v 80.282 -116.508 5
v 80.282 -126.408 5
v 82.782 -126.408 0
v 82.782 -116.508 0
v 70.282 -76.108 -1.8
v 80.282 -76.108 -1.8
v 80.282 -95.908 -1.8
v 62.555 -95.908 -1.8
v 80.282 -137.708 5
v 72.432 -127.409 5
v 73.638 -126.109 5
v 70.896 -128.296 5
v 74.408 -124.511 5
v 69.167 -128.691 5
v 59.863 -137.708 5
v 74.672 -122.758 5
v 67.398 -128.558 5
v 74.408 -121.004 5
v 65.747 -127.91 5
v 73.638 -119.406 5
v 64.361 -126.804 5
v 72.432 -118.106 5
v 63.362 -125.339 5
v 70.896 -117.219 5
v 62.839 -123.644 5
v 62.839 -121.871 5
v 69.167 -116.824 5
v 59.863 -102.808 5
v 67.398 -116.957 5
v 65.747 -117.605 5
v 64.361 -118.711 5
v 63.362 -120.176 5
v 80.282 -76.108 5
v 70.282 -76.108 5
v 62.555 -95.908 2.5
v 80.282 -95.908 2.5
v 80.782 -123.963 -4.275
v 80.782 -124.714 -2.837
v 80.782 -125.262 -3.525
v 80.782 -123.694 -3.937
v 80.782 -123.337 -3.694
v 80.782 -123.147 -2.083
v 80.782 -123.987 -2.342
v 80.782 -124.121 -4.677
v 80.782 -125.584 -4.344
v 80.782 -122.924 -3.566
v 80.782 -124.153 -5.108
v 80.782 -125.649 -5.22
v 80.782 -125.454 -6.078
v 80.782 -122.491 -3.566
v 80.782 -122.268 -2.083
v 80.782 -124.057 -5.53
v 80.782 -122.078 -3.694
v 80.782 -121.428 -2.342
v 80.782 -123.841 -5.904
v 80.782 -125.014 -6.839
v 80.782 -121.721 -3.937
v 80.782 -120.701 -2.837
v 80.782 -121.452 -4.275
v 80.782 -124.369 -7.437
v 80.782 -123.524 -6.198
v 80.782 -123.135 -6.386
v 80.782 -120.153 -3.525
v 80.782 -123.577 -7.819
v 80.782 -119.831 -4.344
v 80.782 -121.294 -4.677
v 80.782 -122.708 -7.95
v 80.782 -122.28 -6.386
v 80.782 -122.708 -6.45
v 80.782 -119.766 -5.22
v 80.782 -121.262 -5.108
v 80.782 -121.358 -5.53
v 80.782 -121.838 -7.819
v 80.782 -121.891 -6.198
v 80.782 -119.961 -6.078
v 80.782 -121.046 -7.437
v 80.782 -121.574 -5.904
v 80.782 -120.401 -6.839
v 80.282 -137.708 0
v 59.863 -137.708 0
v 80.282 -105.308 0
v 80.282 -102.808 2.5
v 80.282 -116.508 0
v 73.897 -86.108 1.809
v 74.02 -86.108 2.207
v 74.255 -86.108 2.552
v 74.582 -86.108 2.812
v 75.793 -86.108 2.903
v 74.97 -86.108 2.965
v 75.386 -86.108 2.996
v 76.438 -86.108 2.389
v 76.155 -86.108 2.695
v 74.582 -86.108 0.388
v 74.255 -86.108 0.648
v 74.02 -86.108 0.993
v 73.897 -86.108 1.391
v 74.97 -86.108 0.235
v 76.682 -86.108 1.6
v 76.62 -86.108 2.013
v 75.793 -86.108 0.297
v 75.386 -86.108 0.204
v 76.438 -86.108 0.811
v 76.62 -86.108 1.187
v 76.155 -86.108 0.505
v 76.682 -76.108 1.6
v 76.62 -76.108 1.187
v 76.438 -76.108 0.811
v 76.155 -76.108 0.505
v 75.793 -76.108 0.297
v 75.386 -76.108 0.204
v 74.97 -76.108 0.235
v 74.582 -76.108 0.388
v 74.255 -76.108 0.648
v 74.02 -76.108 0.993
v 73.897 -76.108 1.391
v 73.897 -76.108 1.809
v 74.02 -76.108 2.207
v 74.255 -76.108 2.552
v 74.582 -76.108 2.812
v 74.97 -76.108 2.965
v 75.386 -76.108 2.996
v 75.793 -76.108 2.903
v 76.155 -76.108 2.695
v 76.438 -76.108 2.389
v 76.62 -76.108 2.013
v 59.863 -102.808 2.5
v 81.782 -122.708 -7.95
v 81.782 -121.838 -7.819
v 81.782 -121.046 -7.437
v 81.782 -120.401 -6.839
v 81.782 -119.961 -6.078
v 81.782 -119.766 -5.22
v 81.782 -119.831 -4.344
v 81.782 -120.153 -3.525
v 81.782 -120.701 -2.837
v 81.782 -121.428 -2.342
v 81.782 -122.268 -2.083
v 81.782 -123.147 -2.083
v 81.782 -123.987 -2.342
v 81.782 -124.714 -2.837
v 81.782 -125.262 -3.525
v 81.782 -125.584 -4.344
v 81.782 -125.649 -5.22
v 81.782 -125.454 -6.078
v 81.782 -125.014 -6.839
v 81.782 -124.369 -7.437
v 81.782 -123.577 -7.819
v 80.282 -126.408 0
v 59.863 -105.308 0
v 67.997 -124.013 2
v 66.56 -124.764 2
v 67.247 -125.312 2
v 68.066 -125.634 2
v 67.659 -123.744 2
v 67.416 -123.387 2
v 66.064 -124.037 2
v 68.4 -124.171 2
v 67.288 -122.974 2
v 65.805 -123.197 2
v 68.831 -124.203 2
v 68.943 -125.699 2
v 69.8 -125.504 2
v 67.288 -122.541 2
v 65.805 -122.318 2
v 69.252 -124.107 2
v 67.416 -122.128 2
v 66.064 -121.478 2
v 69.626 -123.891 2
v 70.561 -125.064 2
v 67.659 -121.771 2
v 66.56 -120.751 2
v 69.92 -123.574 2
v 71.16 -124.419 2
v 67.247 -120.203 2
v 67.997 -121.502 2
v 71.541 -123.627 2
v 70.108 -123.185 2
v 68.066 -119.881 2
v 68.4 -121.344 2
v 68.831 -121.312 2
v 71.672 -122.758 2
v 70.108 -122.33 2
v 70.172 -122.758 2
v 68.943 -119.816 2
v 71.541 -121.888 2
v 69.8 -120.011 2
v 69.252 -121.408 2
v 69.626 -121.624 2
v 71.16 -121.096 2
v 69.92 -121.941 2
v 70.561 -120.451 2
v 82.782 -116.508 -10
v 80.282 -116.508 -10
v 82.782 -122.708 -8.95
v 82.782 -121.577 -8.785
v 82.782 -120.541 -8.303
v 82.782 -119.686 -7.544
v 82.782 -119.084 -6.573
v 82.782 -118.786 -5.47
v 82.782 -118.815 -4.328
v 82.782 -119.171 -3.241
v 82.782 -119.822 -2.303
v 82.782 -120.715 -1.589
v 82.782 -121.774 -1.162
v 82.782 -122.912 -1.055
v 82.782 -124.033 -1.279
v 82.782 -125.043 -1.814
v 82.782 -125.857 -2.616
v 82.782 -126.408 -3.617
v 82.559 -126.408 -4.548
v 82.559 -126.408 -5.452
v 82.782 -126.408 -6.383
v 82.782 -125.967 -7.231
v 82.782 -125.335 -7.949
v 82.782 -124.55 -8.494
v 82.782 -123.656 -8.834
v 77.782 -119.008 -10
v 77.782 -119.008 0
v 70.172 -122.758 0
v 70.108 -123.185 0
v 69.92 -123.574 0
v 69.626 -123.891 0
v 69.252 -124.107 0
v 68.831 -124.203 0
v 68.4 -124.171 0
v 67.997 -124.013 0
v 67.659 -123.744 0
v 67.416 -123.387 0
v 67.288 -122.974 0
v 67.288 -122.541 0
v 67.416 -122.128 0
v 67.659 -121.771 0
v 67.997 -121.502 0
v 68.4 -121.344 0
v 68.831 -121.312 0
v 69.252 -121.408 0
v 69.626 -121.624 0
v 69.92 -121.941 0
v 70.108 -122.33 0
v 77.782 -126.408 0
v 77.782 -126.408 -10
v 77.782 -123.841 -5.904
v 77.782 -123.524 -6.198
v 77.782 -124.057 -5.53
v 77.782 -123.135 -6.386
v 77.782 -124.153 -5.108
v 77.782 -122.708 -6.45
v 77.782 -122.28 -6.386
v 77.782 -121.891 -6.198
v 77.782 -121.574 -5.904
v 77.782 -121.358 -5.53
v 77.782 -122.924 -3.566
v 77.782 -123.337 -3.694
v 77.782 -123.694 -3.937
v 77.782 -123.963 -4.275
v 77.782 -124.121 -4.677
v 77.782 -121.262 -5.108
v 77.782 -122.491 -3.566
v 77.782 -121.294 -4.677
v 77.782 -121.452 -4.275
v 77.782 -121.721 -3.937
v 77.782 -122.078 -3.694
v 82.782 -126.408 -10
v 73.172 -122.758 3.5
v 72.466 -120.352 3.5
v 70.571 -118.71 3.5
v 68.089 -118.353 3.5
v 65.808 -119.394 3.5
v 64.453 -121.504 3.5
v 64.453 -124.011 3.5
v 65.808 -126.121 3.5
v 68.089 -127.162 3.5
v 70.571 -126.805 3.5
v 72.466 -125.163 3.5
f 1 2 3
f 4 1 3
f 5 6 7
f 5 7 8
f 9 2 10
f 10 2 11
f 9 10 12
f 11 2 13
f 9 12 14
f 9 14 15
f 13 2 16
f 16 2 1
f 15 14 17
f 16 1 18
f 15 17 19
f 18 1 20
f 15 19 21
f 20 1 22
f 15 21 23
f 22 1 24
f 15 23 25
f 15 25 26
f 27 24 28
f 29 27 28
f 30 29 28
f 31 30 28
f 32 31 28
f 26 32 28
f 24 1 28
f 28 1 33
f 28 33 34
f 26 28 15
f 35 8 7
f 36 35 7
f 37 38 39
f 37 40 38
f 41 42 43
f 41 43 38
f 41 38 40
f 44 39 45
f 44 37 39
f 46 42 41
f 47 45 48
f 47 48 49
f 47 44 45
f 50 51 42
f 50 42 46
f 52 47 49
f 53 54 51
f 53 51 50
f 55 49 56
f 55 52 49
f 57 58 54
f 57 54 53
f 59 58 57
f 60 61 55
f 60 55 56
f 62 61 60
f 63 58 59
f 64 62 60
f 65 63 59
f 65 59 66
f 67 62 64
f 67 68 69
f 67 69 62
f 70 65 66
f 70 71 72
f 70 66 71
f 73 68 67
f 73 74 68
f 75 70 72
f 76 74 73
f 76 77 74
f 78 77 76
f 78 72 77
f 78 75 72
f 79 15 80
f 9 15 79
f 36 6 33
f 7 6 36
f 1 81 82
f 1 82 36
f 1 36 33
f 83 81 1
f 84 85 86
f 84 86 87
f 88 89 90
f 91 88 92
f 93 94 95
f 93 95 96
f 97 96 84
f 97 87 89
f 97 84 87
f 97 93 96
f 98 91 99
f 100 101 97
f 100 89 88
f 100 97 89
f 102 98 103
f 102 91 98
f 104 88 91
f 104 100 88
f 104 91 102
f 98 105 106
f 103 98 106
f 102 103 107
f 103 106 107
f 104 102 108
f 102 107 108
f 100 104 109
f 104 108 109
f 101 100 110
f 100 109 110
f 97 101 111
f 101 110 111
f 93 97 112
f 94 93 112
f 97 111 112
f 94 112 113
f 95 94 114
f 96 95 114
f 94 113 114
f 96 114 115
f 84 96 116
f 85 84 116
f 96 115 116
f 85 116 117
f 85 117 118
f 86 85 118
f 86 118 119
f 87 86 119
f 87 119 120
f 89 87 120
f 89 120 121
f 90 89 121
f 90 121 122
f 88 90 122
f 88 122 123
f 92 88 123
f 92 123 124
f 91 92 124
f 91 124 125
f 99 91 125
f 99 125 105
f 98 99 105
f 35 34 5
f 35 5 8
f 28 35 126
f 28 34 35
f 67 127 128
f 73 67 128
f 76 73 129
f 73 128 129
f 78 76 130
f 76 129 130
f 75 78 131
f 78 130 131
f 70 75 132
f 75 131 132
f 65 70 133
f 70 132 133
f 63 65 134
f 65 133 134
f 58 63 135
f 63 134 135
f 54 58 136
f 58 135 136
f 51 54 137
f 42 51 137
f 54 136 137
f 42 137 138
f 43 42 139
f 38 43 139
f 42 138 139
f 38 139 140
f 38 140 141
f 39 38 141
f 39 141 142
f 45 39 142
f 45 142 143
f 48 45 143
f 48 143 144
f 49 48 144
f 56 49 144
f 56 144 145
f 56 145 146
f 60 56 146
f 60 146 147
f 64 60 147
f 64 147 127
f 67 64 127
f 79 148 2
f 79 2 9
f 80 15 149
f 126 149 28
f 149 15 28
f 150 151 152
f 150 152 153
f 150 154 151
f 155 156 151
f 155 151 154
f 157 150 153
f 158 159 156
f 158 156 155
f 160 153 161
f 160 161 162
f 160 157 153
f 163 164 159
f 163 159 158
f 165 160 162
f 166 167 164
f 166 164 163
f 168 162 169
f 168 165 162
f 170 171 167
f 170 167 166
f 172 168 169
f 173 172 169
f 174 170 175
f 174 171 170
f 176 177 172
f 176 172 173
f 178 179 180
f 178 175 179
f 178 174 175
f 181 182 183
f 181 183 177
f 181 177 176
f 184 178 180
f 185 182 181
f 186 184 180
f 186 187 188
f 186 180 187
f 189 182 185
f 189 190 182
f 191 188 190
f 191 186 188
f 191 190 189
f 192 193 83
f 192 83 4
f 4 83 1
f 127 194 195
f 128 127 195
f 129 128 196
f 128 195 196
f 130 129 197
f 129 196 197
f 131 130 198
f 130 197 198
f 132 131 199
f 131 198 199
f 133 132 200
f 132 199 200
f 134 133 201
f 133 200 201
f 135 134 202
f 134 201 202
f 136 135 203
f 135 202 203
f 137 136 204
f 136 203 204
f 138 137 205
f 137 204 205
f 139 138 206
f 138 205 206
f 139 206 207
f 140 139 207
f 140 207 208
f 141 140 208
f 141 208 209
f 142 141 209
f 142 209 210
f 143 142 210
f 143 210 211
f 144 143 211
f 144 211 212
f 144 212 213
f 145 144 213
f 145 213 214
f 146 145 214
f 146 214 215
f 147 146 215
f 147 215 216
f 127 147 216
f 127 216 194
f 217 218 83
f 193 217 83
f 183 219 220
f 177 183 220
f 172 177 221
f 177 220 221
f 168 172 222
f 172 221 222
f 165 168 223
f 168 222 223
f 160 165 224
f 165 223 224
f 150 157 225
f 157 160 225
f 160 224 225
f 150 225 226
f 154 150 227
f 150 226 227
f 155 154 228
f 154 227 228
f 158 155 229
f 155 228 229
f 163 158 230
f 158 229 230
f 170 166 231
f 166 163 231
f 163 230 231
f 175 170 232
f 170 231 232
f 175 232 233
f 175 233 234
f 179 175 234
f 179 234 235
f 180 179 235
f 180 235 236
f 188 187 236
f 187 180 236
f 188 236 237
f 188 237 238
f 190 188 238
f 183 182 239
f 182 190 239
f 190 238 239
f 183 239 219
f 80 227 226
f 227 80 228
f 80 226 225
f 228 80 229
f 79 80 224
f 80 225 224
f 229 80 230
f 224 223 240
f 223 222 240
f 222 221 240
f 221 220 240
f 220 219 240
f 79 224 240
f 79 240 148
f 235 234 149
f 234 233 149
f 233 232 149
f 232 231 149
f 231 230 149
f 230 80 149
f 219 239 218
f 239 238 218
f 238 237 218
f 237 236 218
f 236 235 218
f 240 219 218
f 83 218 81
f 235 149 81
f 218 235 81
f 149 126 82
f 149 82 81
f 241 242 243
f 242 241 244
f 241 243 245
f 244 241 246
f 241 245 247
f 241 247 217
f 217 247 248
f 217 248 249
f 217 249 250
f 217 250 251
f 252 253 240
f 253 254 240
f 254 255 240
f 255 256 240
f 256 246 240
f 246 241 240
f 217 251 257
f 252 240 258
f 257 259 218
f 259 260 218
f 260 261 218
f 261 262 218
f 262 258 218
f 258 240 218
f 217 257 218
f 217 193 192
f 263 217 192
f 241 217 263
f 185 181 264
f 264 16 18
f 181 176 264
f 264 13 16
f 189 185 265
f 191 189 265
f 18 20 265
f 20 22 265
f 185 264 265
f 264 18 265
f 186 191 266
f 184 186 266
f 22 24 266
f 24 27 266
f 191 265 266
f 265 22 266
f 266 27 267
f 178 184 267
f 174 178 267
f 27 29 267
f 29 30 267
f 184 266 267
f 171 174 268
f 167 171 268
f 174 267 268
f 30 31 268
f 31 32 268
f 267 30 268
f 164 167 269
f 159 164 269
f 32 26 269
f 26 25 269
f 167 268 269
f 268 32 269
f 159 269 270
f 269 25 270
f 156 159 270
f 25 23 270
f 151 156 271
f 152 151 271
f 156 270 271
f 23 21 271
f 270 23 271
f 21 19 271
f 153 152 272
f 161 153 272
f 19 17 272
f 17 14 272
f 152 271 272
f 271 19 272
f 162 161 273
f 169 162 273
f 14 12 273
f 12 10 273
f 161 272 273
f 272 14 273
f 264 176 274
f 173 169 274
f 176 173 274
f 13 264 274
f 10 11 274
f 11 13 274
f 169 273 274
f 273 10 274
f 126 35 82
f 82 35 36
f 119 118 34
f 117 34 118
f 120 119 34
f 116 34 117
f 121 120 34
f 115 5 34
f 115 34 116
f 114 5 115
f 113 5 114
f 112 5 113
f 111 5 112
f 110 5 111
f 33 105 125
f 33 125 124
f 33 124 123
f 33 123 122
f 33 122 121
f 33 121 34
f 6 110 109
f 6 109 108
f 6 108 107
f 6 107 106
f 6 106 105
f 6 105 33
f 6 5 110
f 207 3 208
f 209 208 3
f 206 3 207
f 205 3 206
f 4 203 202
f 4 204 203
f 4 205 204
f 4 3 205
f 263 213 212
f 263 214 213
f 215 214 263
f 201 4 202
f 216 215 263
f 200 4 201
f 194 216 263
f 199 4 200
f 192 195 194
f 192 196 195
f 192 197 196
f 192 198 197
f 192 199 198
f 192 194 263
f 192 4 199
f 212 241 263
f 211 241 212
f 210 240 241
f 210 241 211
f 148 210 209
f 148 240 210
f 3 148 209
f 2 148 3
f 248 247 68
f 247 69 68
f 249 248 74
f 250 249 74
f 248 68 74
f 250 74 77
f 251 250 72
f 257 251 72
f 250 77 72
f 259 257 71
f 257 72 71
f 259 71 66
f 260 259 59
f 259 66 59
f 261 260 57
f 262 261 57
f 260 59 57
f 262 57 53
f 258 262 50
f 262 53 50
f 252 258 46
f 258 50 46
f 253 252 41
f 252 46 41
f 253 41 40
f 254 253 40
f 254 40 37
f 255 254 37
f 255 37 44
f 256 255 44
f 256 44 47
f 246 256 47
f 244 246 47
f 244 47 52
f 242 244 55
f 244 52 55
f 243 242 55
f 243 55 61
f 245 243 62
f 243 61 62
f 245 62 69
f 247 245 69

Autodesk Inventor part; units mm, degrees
ref_plane "YZ Plane" through (0, 0, 0) normal (1, 0, 0) x (0, 1, 0)
ref_plane "XZ Plane" through (0, 0, 0) normal (0, 1, 0) x (-1, 0, 0)
ref_plane "XY Plane" through (0, 0, 0) normal (0, 0, 1) x (1, 0, 0)
sketch "Esboço1" plane through (0, 0, 0) normal (0, 0, 1) x (1, 0, 0)
  line L0 (80.2817, -126.5075) -> (80.2817, -137.9075)
  line L1 (80.2817, -137.9075) -> (59.6627, -137.9075)
  line L2 (77.7817, -126.5075) -> (80.2817, -126.5075)
  line L3 (77.7817, -119.0075) -> (77.7817, -126.5075)
  line L4 (59.6627, -137.9075) -> (59.6627, -102.6075)
  line L5 (80.2817, -116.5075) -> (77.7817, -119.0075)
  line L6 (59.6627, -102.6075) -> (80.2817, -102.6075)
  line L7 (80.2817, -105.1075) -> (80.2817, -116.5075)
  line L8 (80.2817, -102.6075) -> (80.2817, -105.1075)
  line L9 (77.7817, -122.7575) -> (59.6627, -122.7575)
  circle A0 centre (68.7222, -122.7575) radius 1.45
  point P0 (0, 0)
  dimension "d65" = 2.9
extrude "Extrusão1" add sketch "Esboço1" along normal blind 5 contours L0 L1 L4 L9 A0 L3 L2 | L9 A0 L4 L6 L8 L7 L5 L3
sketch "Esboço2" plane through (0, 0, 5) normal (0, 0, 1) x (1, 0, 0)
  line L0 (69.9722, -137.7075) -> (80.6667, -137.7075)
  line L1 (80.6667, -137.7075) -> (80.6667, -138.3178)
  line L2 (80.6667, -138.3178) -> (69.9722, -138.3178)
  line L3 (69.9722, -137.7075) -> (59.8627, -137.7075)
  line L4 (59.358, -137.7075) -> (59.358, -138.3178)
  line L5 (59.358, -138.3178) -> (69.9722, -138.3178)
  line L6 (69.9722, -102.8075) -> (80.6667, -102.8075)
  line L7 (80.6667, -102.8075) -> (80.6667, -102.3974)
  line L8 (80.6667, -102.3974) -> (69.9722, -102.3974)
  line L9 (69.9722, -102.8075) -> (59.8627, -102.8075)
  line L10 (59.358, -102.8075) -> (59.358, -102.3974)
  line L11 (59.358, -102.3974) -> (69.9722, -102.3974)
  line L12 (59.358, -102.6075) -> (59.358, -138.3178)
  line L13 (59.358, -138.3178) -> (59.8627, -138.3178)
  line L14 (59.8627, -137.7075) -> (59.8627, -102.8075)
  point P0 (0, 0)
extrude "Extrusão2" cut sketch "Esboço2" against normal through all
sketch "Esboço3" plane through (80.2817, -116.5075, 5) normal (1, 0, 0) x (0, 0, -1)
  line L0 (5, 0) -> (5, 13.7) projected
  line L1 (5, 13.7) -> (2.5, 13.7)
  line L2 (5, 13.7) -> (0, 13.7) projected
  line L3 (5, 13.7) -> (5, 11.2)
  line L4 (2.5, 13.7) -> (5, 11.2)
  point P0 (5, 116.5075)
  dimension "d15" = 2.5
  dimension "d16" = 2.5
extrude "Extrusão3" cut sketch "Esboço3" against normal through all
sketch "Esboço4" plane through (0, 0, 0) normal (0, 0, -1) x (-1, 0, 0)
  line L0 (-77.7817, -119.0075) -> (-80.2817, -116.5075) projected
  line L1 (-77.7817, -126.5075) -> (-77.7817, -119.0075) projected
  line L2 (-80.2817, -116.5075) -> (-77.7817, -119.0075)
  line L3 (-77.7817, -119.0075) -> (-77.7817, -126.5075)
  line L4 (-77.7817, -126.5075) -> (-80.2817, -126.5075)
  line L5 (-80.2817, -126.5075) -> (-80.2817, -116.5075)
  point P0 (0, 0)
extrude "Extrusão4" add sketch "Esboço4" along normal blind 10
sketch "Esboço5" plane through (0, 0, -10) normal (0, 0, -1) x (-1, 0, 0)
  line L0 (-77.7817, -119.0075) -> (-80.2817, -116.5075) projected
  line L1 (-80.2817, -116.5075) -> (-80.2817, -116.6075)
  line L2 (-80.2817, -116.6075) -> (-77.7817, -119.1075)
  line L3 (-80.2817, -116.5075) -> (-80.2817, -126.5075) projected
  line L4 (-80.2817, -116.5075) -> (-80.2817, -116.1602)
  line L5 (-80.2817, -116.5075) -> (-80.2817, -105.3075) projected
  line L6 (-80.2817, -116.1602) -> (-77.7817, -116.1602)
  line L7 (-77.7817, -116.1602) -> (-77.7817, -119.1075)
  line L8 (-80.2817, -126.5075) -> (-80.2817, -126.4075)
  line L9 (-80.2817, -126.4075) -> (-77.6383, -126.4075)
  line L10 (-77.6383, -126.4075) -> (-77.6383, -126.5963)
  line L11 (-77.6383, -126.5963) -> (-80.2817, -126.5963)
  line L12 (-80.2817, -126.5963) -> (-80.2817, -126.4075)
  point P0 (0, 0)
  dimension "d26" = 0.1
extrude "Extrusão5" cut sketch "Esboço5" against normal blind 10 contours L0 L4 L6 L7 | L9 L10 L11 L12 L3
sketch "Esboço6" plane through (0, 0, 5) normal (0, 0, 1) x (1, 0, 0)
  line L0 (80.2817, -126.5075) -> (77.7817, -126.5075) projected
  line L1 (80.2817, -126.5075) -> (77.7817, -126.5075)
  line L2 (77.7817, -119.0075) -> (80.2817, -116.5075) projected
  line L3 (77.7817, -126.5075) -> (77.7817, -119.0075)
  line L4 (77.7817, -119.0075) -> (80.2817, -116.5075)
  line L5 (80.2817, -116.5075) -> (80.2817, -126.5075)
  point P0 (0, 0)
extrude "Extrusão6" add sketch "Esboço6" against normal blind 5
sketch "Esboço7" plane through (80.2817, -137.7075, 5) normal (1, 0, 0) x (0, 0, -1)
  line L0 (5, 21.2) -> (15, 21.2) projected
  line L1 (15, 21.2) -> (15, 18.7)
  line L2 (15, 21.2) -> (15, 11.3) projected
  line L3 (5, 18.7) -> (5, 21.2) projected
  line L4 (15, 18.7) -> (5, 18.7)
  line L5 (5, 18.7) -> (5, 21.2)
  line L6 (5, 21.2) -> (15, 21.2)
  line L7 (15, 11.3) -> (5, 11.3) projected
  line L8 (5, 11.3) -> (15, 18.7)
  circle A0 centre (10, 15) radius 1.45
  point P0 (5, 137.7075)
  dimension "d31" = 2.5
  dimension "d32" = 2.9
extrude "Extrusão7" cut sketch "Esboço7" against normal blind 5 contours A0 L8 | L8 A0
sketch "Esboço8" plane through (0, 0, 5) normal (0, 0, 1) x (1, 0, 0)
  line L0 (80.2817, -137.7075) -> (80.2817, -102.8075) projected
  line L1 (80.2817, -102.8075) -> (80.2817, -95.9075)
  line L2 (80.2817, -95.9075) -> (50.2817, -95.9075)
  line L3 (50.2817, -95.9075) -> (50.2817, -102.8075)
  line L4 (80.2817, -102.8075) -> (59.8627, -102.8075) projected
  line L5 (50.2817, -102.8075) -> (80.2817, -102.8075)
  point P0 (0, 0)
  dimension "d35" = 6.9
  dimension "d36" = 30
extrude "Extrusão8" add sketch "Esboço8" against normal blind 2.5
sketch "Esboço10" plane through (50.2817, -95.9075, 5) normal (0, 1, 0) x (1, 0, 0)
  line L0 (30, 0) -> (30, 2.5) projected
  line L1 (30, 5) -> (30, 2.5) projected
  line L2 (30, 0) -> (30, 2.5)
  line L3 (30, 2.5) -> (30, 6.8)
  line L4 (30, 6.8) -> (0, 6.8)
  line L5 (0, 0) -> (0, 2.5) projected
  line L6 (0, 6.8) -> (0, 0)
  line L7 (0, 0) -> (30, 0)
  point P0 (-50.2817, 5)
  dimension "d39" = 4.3
extrude "Extrusão9" add sketch "Esboço10" along normal blind 2.5
sketch "Esboço11" plane through (50.2817, -93.4075, 5) normal (0, 1, 0) x (1, 0, 0)
  line L0 (30, 2.5) -> (30, 6.8) projected
  line L1 (30, 5) -> (30, 2.5) projected
  line L2 (30, 6.8) -> (30, 2.5)
  line L3 (0, 0) -> (0, 2.5) projected
  line L4 (30, 2.5) -> (0, 2.5)
  line L5 (0, 6.8) -> (0, 2.5) projected
  line L6 (0, 2.5) -> (0, 6.8)
  line L7 (0, 6.8) -> (30, 6.8)
  line L8 (0, 2.5) -> (30, 2.5)
  line L9 (30, 2.5) -> (30, 0)
  line L10 (30, 0) -> (0, 0)
  line L11 (0, 0) -> (0, 2.5)
  point P0 (-50.2817, 5)
  dimension "d42" = 4.3
extrude "Extrusão10" add sketch "Esboço11" along normal blind 12.3
sketch "Esboço12" plane through (80.2817, -95.9075, -1.8) normal (0, 0, -1) x (-1, 0, 0)
  line L0 (0, 14.8) -> (30, 14.8) projected
  line L1 (0, 14.8) -> (30, 14.8)
  line L2 (30, 14.8) -> (30, 19.8)
  line L3 (30, 19.8) -> (0, 19.8)
  line L4 (0, 19.8) -> (0, 14.8)
  point P0 (80.2817, 95.9075)
  dimension "d45" = 5
extrude "Extrusão11" add sketch "Esboço12" against normal blind 6.8
sketch "Esboço14" plane through (80.2817, -137.7075, 5) normal (1, 0, 0) x (0, 0, -1)
  line L0 (5, 18.7) -> (5, 21.2) projected
  line L1 (15, 21.2) -> (15, 11.3) projected
  line L2 (5, 21.2) -> (15, 21.2)
  line L3 (15, 21.2) -> (15, 11.3)
  line L4 (15, 11.3) -> (5, 11.3)
  line L5 (5, 11.3) -> (5, 21.2)
  circle A0 centre (10, 15) radius 1.45 projected
  circle A1 centre (10, 15) radius 1.45
  point P0 (5, 137.7075)
extrude "Extrusão13" add sketch "Esboço14" along normal blind 2.5
sketch "Esboço15" plane through (77.7817, -126.4075, -10) normal (0, -1, 0) x (1, 0, 0)
  line L0 (5, 10) -> (5, 0) projected
  line L1 (2.5, 15) -> (2.5, 10) projected
  line L2 (5, 10) -> (2.5, 10)
  line L3 (2.5, 10) -> (2.5, 15)
  line L4 (2.5, 15) -> (5, 10)
  point P0 (-77.7817, 10)
extrude "Extrusão14" add sketch "Esboço15" against normal blind 9.9
sketch "Esboço16" plane through (50.2817, -76.1075, -1.8) normal (0, 1, 0) x (1, 0, 0)
  line L0 (30, 0) -> (0, 0) projected
  line L1 (15, 0) -> (15, -6.8)
  line L2 (9.581, -6.8) -> (30, -6.8) projected
  line L3 (15, -3.4) -> (30, -3.4)
  line L4 (30, -3.4) -> (25, -3.4)
  circle A0 centre (25, -3.4) radius 1.4
  point P0 (-50.2817, -1.8)
  dimension "d92" = 5
  dimension "d99" = 2.8
extrude "Extrusão15" cut sketch "Esboço16" against normal blind 10
sketch "Esboço18" plane through (0, 0, 5) normal (0, 0, 1) x (1, 0, 0)
  line L0 (80.2817, -116.5075) -> (80.2817, -76.1075) projected
  line L1 (80.2817, -76.1075) -> (70.2817, -76.1075)
  line L2 (50.2817, -76.1075) -> (80.2817, -76.1075) projected
  line L3 (80.2817, -102.8075) -> (59.8627, -102.8075) projected
  line L4 (70.2817, -76.1075) -> (59.8627, -102.8075)
  line L5 (59.8627, -102.8075) -> (80.2817, -102.8075)
  line L6 (80.2817, -102.8075) -> (80.2817, -76.1075)
  line L7 (70.2817, -76.1075) -> (50.2817, -76.1075)
  line L8 (50.2817, -76.1075) -> (50.2817, -102.8075) projected
  line L9 (50.2817, -102.8075) -> (59.8627, -102.8075)
  line L10 (50.2817, -102.8075) -> (50.2817, -76.1075)
  point P0 (0, 0)
  dimension "d96" = 10
extrude "Extrusão16" cut sketch "Esboço18" against normal through all contours L9 L8 L2 L4
sketch "Esboço19" plane through (0, 0, 5) normal (0, 0, 1) x (1, 0, 0)
  circle A0 centre (68.7222, -122.7575) radius 1.45 projected
  circle A1 centre (68.7222, -122.7575) radius 1.45
  circle A2 centre (68.7222, -122.7575) radius 2.95
  point P0 (0, 0)
  dimension "d100" = 5.9
extrude "Extrusão17" cut sketch "Esboço19" against normal blind 3
chamfer "Chanfro9" distance 3 angle 45 1 edges at (65.7722, -122.7575, 5)
sketch "Esboço20" plane through (82.7817, -137.7075, 5) normal (1, 0, 0) x (0, 0, -1)
  circle A0 centre (10, 15) radius 1.45 projected
  circle A1 centre (10, 15) radius 1.45
  circle A2 centre (10, 15) radius 2.95
  point P0 (5, 137.7075)
  dimension "d106" = 5.9
extrude "Extrusão18" cut sketch "Esboço20" against normal blind 2
chamfer "Chanfro10" distance 1 angle 45 1 edges at (82.7817, -122.7075, -2.05)
properties part number "suporte_esquerdo"
